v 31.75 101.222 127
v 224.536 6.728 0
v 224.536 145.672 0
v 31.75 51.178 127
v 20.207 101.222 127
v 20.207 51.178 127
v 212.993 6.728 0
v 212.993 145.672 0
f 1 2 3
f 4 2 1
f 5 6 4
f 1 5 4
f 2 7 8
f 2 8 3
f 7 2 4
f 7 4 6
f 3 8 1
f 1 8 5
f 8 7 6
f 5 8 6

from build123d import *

# Parameters (mm, degrees)
BOSS_EXTRUDE1_DEPTH = 152.4
SKETCH3_OUTSIDE_W   = 237.922
SKETCH3_OUTSIDE_H   = 226.36
CUT_EXTRUDE2_DEPTH  = 365.792952335
SHELL1_T            = -6.35
SKETCH8_W           = 266.062607669
SKETCH8_H           = 282.191647152
CUT_EXTRUDE6_DEPTH  = 300.618382774
CUT_EXTRUDE3_DEPTH  = 350.742043935
SKETCH5_OUTSIDE_W   = 351.444
SKETCH5_OUTSIDE_H   = 196.758
CUT_EXTRUDE4_DEPTH  = 296.012320666


with BuildPart() as part:
    # Sketch2 → Boss-Extrude1 (new body)
    with BuildSketch(Plane(origin=(0, 0, 0), x_dir=(1, 0, 0), z_dir=(0, 1, 0))):
        Polygon((-57.15, 0), (224.536, 0), (-24.357683353, -163.961583236), align=None)
    extrude(amount=BOSS_EXTRUDE1_DEPTH)

    # Sketch3 outside → Cut-Extrude2 (cut, through all)
    with BuildSketch(Plane(origin=(-63.5, 0, 0), x_dir=(0, 0, -1), z_dir=(1, 0, 0))):
        with Locations((-81.981, 76.2)):
            Rectangle(SKETCH3_OUTSIDE_W, SKETCH3_OUTSIDE_H)
        Polygon((0, 152.4), (-127, 107.95), (-217.714285714, 76.2), (-127, 44.45), (0, 0), align=None, mode=Mode.SUBTRACT)
    extrude(amount=CUT_EXTRUDE2_DEPTH, mode=Mode.SUBTRACT)

    # Shell1
    shell1_openings = [part.faces().sort_by_distance(p)[0] for p in [
        (83.693, 76.2, 0),
    ]]
    offset(amount=SHELL1_T, openings=shell1_openings, kind=Kind.INTERSECTION)

    # Sketch8 → Cut-Extrude6 (cut, through all)
    with BuildSketch(Plane.XY.offset(127)):
        with Locations((40.834882022, 90.229060284)):
            Rectangle(SKETCH8_W, SKETCH8_H)
    extrude(amount=CUT_EXTRUDE6_DEPTH, mode=Mode.SUBTRACT)

    # Sketch4 → Cut-Extrude3 (cut, through all)
    with BuildSketch(Plane(origin=(-63.5, 0, 0), x_dir=(0, 0, -1), z_dir=(1, 0, 0))):
        Polygon((0, 152.4), (0, 145.672295618), (-163.961583236, 88.285741485), (-163.961583236, 95.013445867), align=None)
        Polygon((-163.961583236, 64.114258515), (0, 6.727704382), (0, 0), (-163.961583236, 57.386554133), align=None)
    extrude(amount=CUT_EXTRUDE3_DEPTH, mode=Mode.SUBTRACT)


with BuildPart() as cut_extrude3_piece_1:
    # of the separate pieces the step leaves, piece 1, a body of its own (cut_extrude3_pieces)
    add(part.part.solids().sort_by_distance((224.536, 6.727704382, 0))[0])


with BuildPart() as cut_extrude3_piece_2:
    # of the separate pieces the step leaves, piece 2, a body of its own (cut_extrude3_pieces)
    add(part.part.solids().sort_by_distance((-31.75, 51.177704382, 127))[0])

    # Sketch5 outside → Cut-Extrude4 (cut, through all)
    with BuildSketch(Plane(origin=(0, 149.86, 0), x_dir=(1, 0, 0), z_dir=(0, 1, 0))):
        with Locations((83.693, -63.5)):
            Rectangle(SKETCH5_OUTSIDE_W, SKETCH5_OUTSIDE_H)
        Polygon((-20.197755363, -152.382449275), (-18.635799907, -160.192226553), (344.317071882, -160.192226553), (317.879717865, 72.864270331), (-35.136715197, 43.31663937), align=None, mode=Mode.SUBTRACT)
    extrude(amount=-CUT_EXTRUDE4_DEPTH, mode=Mode.SUBTRACT)


solid = cut_extrude3_piece_1.part
